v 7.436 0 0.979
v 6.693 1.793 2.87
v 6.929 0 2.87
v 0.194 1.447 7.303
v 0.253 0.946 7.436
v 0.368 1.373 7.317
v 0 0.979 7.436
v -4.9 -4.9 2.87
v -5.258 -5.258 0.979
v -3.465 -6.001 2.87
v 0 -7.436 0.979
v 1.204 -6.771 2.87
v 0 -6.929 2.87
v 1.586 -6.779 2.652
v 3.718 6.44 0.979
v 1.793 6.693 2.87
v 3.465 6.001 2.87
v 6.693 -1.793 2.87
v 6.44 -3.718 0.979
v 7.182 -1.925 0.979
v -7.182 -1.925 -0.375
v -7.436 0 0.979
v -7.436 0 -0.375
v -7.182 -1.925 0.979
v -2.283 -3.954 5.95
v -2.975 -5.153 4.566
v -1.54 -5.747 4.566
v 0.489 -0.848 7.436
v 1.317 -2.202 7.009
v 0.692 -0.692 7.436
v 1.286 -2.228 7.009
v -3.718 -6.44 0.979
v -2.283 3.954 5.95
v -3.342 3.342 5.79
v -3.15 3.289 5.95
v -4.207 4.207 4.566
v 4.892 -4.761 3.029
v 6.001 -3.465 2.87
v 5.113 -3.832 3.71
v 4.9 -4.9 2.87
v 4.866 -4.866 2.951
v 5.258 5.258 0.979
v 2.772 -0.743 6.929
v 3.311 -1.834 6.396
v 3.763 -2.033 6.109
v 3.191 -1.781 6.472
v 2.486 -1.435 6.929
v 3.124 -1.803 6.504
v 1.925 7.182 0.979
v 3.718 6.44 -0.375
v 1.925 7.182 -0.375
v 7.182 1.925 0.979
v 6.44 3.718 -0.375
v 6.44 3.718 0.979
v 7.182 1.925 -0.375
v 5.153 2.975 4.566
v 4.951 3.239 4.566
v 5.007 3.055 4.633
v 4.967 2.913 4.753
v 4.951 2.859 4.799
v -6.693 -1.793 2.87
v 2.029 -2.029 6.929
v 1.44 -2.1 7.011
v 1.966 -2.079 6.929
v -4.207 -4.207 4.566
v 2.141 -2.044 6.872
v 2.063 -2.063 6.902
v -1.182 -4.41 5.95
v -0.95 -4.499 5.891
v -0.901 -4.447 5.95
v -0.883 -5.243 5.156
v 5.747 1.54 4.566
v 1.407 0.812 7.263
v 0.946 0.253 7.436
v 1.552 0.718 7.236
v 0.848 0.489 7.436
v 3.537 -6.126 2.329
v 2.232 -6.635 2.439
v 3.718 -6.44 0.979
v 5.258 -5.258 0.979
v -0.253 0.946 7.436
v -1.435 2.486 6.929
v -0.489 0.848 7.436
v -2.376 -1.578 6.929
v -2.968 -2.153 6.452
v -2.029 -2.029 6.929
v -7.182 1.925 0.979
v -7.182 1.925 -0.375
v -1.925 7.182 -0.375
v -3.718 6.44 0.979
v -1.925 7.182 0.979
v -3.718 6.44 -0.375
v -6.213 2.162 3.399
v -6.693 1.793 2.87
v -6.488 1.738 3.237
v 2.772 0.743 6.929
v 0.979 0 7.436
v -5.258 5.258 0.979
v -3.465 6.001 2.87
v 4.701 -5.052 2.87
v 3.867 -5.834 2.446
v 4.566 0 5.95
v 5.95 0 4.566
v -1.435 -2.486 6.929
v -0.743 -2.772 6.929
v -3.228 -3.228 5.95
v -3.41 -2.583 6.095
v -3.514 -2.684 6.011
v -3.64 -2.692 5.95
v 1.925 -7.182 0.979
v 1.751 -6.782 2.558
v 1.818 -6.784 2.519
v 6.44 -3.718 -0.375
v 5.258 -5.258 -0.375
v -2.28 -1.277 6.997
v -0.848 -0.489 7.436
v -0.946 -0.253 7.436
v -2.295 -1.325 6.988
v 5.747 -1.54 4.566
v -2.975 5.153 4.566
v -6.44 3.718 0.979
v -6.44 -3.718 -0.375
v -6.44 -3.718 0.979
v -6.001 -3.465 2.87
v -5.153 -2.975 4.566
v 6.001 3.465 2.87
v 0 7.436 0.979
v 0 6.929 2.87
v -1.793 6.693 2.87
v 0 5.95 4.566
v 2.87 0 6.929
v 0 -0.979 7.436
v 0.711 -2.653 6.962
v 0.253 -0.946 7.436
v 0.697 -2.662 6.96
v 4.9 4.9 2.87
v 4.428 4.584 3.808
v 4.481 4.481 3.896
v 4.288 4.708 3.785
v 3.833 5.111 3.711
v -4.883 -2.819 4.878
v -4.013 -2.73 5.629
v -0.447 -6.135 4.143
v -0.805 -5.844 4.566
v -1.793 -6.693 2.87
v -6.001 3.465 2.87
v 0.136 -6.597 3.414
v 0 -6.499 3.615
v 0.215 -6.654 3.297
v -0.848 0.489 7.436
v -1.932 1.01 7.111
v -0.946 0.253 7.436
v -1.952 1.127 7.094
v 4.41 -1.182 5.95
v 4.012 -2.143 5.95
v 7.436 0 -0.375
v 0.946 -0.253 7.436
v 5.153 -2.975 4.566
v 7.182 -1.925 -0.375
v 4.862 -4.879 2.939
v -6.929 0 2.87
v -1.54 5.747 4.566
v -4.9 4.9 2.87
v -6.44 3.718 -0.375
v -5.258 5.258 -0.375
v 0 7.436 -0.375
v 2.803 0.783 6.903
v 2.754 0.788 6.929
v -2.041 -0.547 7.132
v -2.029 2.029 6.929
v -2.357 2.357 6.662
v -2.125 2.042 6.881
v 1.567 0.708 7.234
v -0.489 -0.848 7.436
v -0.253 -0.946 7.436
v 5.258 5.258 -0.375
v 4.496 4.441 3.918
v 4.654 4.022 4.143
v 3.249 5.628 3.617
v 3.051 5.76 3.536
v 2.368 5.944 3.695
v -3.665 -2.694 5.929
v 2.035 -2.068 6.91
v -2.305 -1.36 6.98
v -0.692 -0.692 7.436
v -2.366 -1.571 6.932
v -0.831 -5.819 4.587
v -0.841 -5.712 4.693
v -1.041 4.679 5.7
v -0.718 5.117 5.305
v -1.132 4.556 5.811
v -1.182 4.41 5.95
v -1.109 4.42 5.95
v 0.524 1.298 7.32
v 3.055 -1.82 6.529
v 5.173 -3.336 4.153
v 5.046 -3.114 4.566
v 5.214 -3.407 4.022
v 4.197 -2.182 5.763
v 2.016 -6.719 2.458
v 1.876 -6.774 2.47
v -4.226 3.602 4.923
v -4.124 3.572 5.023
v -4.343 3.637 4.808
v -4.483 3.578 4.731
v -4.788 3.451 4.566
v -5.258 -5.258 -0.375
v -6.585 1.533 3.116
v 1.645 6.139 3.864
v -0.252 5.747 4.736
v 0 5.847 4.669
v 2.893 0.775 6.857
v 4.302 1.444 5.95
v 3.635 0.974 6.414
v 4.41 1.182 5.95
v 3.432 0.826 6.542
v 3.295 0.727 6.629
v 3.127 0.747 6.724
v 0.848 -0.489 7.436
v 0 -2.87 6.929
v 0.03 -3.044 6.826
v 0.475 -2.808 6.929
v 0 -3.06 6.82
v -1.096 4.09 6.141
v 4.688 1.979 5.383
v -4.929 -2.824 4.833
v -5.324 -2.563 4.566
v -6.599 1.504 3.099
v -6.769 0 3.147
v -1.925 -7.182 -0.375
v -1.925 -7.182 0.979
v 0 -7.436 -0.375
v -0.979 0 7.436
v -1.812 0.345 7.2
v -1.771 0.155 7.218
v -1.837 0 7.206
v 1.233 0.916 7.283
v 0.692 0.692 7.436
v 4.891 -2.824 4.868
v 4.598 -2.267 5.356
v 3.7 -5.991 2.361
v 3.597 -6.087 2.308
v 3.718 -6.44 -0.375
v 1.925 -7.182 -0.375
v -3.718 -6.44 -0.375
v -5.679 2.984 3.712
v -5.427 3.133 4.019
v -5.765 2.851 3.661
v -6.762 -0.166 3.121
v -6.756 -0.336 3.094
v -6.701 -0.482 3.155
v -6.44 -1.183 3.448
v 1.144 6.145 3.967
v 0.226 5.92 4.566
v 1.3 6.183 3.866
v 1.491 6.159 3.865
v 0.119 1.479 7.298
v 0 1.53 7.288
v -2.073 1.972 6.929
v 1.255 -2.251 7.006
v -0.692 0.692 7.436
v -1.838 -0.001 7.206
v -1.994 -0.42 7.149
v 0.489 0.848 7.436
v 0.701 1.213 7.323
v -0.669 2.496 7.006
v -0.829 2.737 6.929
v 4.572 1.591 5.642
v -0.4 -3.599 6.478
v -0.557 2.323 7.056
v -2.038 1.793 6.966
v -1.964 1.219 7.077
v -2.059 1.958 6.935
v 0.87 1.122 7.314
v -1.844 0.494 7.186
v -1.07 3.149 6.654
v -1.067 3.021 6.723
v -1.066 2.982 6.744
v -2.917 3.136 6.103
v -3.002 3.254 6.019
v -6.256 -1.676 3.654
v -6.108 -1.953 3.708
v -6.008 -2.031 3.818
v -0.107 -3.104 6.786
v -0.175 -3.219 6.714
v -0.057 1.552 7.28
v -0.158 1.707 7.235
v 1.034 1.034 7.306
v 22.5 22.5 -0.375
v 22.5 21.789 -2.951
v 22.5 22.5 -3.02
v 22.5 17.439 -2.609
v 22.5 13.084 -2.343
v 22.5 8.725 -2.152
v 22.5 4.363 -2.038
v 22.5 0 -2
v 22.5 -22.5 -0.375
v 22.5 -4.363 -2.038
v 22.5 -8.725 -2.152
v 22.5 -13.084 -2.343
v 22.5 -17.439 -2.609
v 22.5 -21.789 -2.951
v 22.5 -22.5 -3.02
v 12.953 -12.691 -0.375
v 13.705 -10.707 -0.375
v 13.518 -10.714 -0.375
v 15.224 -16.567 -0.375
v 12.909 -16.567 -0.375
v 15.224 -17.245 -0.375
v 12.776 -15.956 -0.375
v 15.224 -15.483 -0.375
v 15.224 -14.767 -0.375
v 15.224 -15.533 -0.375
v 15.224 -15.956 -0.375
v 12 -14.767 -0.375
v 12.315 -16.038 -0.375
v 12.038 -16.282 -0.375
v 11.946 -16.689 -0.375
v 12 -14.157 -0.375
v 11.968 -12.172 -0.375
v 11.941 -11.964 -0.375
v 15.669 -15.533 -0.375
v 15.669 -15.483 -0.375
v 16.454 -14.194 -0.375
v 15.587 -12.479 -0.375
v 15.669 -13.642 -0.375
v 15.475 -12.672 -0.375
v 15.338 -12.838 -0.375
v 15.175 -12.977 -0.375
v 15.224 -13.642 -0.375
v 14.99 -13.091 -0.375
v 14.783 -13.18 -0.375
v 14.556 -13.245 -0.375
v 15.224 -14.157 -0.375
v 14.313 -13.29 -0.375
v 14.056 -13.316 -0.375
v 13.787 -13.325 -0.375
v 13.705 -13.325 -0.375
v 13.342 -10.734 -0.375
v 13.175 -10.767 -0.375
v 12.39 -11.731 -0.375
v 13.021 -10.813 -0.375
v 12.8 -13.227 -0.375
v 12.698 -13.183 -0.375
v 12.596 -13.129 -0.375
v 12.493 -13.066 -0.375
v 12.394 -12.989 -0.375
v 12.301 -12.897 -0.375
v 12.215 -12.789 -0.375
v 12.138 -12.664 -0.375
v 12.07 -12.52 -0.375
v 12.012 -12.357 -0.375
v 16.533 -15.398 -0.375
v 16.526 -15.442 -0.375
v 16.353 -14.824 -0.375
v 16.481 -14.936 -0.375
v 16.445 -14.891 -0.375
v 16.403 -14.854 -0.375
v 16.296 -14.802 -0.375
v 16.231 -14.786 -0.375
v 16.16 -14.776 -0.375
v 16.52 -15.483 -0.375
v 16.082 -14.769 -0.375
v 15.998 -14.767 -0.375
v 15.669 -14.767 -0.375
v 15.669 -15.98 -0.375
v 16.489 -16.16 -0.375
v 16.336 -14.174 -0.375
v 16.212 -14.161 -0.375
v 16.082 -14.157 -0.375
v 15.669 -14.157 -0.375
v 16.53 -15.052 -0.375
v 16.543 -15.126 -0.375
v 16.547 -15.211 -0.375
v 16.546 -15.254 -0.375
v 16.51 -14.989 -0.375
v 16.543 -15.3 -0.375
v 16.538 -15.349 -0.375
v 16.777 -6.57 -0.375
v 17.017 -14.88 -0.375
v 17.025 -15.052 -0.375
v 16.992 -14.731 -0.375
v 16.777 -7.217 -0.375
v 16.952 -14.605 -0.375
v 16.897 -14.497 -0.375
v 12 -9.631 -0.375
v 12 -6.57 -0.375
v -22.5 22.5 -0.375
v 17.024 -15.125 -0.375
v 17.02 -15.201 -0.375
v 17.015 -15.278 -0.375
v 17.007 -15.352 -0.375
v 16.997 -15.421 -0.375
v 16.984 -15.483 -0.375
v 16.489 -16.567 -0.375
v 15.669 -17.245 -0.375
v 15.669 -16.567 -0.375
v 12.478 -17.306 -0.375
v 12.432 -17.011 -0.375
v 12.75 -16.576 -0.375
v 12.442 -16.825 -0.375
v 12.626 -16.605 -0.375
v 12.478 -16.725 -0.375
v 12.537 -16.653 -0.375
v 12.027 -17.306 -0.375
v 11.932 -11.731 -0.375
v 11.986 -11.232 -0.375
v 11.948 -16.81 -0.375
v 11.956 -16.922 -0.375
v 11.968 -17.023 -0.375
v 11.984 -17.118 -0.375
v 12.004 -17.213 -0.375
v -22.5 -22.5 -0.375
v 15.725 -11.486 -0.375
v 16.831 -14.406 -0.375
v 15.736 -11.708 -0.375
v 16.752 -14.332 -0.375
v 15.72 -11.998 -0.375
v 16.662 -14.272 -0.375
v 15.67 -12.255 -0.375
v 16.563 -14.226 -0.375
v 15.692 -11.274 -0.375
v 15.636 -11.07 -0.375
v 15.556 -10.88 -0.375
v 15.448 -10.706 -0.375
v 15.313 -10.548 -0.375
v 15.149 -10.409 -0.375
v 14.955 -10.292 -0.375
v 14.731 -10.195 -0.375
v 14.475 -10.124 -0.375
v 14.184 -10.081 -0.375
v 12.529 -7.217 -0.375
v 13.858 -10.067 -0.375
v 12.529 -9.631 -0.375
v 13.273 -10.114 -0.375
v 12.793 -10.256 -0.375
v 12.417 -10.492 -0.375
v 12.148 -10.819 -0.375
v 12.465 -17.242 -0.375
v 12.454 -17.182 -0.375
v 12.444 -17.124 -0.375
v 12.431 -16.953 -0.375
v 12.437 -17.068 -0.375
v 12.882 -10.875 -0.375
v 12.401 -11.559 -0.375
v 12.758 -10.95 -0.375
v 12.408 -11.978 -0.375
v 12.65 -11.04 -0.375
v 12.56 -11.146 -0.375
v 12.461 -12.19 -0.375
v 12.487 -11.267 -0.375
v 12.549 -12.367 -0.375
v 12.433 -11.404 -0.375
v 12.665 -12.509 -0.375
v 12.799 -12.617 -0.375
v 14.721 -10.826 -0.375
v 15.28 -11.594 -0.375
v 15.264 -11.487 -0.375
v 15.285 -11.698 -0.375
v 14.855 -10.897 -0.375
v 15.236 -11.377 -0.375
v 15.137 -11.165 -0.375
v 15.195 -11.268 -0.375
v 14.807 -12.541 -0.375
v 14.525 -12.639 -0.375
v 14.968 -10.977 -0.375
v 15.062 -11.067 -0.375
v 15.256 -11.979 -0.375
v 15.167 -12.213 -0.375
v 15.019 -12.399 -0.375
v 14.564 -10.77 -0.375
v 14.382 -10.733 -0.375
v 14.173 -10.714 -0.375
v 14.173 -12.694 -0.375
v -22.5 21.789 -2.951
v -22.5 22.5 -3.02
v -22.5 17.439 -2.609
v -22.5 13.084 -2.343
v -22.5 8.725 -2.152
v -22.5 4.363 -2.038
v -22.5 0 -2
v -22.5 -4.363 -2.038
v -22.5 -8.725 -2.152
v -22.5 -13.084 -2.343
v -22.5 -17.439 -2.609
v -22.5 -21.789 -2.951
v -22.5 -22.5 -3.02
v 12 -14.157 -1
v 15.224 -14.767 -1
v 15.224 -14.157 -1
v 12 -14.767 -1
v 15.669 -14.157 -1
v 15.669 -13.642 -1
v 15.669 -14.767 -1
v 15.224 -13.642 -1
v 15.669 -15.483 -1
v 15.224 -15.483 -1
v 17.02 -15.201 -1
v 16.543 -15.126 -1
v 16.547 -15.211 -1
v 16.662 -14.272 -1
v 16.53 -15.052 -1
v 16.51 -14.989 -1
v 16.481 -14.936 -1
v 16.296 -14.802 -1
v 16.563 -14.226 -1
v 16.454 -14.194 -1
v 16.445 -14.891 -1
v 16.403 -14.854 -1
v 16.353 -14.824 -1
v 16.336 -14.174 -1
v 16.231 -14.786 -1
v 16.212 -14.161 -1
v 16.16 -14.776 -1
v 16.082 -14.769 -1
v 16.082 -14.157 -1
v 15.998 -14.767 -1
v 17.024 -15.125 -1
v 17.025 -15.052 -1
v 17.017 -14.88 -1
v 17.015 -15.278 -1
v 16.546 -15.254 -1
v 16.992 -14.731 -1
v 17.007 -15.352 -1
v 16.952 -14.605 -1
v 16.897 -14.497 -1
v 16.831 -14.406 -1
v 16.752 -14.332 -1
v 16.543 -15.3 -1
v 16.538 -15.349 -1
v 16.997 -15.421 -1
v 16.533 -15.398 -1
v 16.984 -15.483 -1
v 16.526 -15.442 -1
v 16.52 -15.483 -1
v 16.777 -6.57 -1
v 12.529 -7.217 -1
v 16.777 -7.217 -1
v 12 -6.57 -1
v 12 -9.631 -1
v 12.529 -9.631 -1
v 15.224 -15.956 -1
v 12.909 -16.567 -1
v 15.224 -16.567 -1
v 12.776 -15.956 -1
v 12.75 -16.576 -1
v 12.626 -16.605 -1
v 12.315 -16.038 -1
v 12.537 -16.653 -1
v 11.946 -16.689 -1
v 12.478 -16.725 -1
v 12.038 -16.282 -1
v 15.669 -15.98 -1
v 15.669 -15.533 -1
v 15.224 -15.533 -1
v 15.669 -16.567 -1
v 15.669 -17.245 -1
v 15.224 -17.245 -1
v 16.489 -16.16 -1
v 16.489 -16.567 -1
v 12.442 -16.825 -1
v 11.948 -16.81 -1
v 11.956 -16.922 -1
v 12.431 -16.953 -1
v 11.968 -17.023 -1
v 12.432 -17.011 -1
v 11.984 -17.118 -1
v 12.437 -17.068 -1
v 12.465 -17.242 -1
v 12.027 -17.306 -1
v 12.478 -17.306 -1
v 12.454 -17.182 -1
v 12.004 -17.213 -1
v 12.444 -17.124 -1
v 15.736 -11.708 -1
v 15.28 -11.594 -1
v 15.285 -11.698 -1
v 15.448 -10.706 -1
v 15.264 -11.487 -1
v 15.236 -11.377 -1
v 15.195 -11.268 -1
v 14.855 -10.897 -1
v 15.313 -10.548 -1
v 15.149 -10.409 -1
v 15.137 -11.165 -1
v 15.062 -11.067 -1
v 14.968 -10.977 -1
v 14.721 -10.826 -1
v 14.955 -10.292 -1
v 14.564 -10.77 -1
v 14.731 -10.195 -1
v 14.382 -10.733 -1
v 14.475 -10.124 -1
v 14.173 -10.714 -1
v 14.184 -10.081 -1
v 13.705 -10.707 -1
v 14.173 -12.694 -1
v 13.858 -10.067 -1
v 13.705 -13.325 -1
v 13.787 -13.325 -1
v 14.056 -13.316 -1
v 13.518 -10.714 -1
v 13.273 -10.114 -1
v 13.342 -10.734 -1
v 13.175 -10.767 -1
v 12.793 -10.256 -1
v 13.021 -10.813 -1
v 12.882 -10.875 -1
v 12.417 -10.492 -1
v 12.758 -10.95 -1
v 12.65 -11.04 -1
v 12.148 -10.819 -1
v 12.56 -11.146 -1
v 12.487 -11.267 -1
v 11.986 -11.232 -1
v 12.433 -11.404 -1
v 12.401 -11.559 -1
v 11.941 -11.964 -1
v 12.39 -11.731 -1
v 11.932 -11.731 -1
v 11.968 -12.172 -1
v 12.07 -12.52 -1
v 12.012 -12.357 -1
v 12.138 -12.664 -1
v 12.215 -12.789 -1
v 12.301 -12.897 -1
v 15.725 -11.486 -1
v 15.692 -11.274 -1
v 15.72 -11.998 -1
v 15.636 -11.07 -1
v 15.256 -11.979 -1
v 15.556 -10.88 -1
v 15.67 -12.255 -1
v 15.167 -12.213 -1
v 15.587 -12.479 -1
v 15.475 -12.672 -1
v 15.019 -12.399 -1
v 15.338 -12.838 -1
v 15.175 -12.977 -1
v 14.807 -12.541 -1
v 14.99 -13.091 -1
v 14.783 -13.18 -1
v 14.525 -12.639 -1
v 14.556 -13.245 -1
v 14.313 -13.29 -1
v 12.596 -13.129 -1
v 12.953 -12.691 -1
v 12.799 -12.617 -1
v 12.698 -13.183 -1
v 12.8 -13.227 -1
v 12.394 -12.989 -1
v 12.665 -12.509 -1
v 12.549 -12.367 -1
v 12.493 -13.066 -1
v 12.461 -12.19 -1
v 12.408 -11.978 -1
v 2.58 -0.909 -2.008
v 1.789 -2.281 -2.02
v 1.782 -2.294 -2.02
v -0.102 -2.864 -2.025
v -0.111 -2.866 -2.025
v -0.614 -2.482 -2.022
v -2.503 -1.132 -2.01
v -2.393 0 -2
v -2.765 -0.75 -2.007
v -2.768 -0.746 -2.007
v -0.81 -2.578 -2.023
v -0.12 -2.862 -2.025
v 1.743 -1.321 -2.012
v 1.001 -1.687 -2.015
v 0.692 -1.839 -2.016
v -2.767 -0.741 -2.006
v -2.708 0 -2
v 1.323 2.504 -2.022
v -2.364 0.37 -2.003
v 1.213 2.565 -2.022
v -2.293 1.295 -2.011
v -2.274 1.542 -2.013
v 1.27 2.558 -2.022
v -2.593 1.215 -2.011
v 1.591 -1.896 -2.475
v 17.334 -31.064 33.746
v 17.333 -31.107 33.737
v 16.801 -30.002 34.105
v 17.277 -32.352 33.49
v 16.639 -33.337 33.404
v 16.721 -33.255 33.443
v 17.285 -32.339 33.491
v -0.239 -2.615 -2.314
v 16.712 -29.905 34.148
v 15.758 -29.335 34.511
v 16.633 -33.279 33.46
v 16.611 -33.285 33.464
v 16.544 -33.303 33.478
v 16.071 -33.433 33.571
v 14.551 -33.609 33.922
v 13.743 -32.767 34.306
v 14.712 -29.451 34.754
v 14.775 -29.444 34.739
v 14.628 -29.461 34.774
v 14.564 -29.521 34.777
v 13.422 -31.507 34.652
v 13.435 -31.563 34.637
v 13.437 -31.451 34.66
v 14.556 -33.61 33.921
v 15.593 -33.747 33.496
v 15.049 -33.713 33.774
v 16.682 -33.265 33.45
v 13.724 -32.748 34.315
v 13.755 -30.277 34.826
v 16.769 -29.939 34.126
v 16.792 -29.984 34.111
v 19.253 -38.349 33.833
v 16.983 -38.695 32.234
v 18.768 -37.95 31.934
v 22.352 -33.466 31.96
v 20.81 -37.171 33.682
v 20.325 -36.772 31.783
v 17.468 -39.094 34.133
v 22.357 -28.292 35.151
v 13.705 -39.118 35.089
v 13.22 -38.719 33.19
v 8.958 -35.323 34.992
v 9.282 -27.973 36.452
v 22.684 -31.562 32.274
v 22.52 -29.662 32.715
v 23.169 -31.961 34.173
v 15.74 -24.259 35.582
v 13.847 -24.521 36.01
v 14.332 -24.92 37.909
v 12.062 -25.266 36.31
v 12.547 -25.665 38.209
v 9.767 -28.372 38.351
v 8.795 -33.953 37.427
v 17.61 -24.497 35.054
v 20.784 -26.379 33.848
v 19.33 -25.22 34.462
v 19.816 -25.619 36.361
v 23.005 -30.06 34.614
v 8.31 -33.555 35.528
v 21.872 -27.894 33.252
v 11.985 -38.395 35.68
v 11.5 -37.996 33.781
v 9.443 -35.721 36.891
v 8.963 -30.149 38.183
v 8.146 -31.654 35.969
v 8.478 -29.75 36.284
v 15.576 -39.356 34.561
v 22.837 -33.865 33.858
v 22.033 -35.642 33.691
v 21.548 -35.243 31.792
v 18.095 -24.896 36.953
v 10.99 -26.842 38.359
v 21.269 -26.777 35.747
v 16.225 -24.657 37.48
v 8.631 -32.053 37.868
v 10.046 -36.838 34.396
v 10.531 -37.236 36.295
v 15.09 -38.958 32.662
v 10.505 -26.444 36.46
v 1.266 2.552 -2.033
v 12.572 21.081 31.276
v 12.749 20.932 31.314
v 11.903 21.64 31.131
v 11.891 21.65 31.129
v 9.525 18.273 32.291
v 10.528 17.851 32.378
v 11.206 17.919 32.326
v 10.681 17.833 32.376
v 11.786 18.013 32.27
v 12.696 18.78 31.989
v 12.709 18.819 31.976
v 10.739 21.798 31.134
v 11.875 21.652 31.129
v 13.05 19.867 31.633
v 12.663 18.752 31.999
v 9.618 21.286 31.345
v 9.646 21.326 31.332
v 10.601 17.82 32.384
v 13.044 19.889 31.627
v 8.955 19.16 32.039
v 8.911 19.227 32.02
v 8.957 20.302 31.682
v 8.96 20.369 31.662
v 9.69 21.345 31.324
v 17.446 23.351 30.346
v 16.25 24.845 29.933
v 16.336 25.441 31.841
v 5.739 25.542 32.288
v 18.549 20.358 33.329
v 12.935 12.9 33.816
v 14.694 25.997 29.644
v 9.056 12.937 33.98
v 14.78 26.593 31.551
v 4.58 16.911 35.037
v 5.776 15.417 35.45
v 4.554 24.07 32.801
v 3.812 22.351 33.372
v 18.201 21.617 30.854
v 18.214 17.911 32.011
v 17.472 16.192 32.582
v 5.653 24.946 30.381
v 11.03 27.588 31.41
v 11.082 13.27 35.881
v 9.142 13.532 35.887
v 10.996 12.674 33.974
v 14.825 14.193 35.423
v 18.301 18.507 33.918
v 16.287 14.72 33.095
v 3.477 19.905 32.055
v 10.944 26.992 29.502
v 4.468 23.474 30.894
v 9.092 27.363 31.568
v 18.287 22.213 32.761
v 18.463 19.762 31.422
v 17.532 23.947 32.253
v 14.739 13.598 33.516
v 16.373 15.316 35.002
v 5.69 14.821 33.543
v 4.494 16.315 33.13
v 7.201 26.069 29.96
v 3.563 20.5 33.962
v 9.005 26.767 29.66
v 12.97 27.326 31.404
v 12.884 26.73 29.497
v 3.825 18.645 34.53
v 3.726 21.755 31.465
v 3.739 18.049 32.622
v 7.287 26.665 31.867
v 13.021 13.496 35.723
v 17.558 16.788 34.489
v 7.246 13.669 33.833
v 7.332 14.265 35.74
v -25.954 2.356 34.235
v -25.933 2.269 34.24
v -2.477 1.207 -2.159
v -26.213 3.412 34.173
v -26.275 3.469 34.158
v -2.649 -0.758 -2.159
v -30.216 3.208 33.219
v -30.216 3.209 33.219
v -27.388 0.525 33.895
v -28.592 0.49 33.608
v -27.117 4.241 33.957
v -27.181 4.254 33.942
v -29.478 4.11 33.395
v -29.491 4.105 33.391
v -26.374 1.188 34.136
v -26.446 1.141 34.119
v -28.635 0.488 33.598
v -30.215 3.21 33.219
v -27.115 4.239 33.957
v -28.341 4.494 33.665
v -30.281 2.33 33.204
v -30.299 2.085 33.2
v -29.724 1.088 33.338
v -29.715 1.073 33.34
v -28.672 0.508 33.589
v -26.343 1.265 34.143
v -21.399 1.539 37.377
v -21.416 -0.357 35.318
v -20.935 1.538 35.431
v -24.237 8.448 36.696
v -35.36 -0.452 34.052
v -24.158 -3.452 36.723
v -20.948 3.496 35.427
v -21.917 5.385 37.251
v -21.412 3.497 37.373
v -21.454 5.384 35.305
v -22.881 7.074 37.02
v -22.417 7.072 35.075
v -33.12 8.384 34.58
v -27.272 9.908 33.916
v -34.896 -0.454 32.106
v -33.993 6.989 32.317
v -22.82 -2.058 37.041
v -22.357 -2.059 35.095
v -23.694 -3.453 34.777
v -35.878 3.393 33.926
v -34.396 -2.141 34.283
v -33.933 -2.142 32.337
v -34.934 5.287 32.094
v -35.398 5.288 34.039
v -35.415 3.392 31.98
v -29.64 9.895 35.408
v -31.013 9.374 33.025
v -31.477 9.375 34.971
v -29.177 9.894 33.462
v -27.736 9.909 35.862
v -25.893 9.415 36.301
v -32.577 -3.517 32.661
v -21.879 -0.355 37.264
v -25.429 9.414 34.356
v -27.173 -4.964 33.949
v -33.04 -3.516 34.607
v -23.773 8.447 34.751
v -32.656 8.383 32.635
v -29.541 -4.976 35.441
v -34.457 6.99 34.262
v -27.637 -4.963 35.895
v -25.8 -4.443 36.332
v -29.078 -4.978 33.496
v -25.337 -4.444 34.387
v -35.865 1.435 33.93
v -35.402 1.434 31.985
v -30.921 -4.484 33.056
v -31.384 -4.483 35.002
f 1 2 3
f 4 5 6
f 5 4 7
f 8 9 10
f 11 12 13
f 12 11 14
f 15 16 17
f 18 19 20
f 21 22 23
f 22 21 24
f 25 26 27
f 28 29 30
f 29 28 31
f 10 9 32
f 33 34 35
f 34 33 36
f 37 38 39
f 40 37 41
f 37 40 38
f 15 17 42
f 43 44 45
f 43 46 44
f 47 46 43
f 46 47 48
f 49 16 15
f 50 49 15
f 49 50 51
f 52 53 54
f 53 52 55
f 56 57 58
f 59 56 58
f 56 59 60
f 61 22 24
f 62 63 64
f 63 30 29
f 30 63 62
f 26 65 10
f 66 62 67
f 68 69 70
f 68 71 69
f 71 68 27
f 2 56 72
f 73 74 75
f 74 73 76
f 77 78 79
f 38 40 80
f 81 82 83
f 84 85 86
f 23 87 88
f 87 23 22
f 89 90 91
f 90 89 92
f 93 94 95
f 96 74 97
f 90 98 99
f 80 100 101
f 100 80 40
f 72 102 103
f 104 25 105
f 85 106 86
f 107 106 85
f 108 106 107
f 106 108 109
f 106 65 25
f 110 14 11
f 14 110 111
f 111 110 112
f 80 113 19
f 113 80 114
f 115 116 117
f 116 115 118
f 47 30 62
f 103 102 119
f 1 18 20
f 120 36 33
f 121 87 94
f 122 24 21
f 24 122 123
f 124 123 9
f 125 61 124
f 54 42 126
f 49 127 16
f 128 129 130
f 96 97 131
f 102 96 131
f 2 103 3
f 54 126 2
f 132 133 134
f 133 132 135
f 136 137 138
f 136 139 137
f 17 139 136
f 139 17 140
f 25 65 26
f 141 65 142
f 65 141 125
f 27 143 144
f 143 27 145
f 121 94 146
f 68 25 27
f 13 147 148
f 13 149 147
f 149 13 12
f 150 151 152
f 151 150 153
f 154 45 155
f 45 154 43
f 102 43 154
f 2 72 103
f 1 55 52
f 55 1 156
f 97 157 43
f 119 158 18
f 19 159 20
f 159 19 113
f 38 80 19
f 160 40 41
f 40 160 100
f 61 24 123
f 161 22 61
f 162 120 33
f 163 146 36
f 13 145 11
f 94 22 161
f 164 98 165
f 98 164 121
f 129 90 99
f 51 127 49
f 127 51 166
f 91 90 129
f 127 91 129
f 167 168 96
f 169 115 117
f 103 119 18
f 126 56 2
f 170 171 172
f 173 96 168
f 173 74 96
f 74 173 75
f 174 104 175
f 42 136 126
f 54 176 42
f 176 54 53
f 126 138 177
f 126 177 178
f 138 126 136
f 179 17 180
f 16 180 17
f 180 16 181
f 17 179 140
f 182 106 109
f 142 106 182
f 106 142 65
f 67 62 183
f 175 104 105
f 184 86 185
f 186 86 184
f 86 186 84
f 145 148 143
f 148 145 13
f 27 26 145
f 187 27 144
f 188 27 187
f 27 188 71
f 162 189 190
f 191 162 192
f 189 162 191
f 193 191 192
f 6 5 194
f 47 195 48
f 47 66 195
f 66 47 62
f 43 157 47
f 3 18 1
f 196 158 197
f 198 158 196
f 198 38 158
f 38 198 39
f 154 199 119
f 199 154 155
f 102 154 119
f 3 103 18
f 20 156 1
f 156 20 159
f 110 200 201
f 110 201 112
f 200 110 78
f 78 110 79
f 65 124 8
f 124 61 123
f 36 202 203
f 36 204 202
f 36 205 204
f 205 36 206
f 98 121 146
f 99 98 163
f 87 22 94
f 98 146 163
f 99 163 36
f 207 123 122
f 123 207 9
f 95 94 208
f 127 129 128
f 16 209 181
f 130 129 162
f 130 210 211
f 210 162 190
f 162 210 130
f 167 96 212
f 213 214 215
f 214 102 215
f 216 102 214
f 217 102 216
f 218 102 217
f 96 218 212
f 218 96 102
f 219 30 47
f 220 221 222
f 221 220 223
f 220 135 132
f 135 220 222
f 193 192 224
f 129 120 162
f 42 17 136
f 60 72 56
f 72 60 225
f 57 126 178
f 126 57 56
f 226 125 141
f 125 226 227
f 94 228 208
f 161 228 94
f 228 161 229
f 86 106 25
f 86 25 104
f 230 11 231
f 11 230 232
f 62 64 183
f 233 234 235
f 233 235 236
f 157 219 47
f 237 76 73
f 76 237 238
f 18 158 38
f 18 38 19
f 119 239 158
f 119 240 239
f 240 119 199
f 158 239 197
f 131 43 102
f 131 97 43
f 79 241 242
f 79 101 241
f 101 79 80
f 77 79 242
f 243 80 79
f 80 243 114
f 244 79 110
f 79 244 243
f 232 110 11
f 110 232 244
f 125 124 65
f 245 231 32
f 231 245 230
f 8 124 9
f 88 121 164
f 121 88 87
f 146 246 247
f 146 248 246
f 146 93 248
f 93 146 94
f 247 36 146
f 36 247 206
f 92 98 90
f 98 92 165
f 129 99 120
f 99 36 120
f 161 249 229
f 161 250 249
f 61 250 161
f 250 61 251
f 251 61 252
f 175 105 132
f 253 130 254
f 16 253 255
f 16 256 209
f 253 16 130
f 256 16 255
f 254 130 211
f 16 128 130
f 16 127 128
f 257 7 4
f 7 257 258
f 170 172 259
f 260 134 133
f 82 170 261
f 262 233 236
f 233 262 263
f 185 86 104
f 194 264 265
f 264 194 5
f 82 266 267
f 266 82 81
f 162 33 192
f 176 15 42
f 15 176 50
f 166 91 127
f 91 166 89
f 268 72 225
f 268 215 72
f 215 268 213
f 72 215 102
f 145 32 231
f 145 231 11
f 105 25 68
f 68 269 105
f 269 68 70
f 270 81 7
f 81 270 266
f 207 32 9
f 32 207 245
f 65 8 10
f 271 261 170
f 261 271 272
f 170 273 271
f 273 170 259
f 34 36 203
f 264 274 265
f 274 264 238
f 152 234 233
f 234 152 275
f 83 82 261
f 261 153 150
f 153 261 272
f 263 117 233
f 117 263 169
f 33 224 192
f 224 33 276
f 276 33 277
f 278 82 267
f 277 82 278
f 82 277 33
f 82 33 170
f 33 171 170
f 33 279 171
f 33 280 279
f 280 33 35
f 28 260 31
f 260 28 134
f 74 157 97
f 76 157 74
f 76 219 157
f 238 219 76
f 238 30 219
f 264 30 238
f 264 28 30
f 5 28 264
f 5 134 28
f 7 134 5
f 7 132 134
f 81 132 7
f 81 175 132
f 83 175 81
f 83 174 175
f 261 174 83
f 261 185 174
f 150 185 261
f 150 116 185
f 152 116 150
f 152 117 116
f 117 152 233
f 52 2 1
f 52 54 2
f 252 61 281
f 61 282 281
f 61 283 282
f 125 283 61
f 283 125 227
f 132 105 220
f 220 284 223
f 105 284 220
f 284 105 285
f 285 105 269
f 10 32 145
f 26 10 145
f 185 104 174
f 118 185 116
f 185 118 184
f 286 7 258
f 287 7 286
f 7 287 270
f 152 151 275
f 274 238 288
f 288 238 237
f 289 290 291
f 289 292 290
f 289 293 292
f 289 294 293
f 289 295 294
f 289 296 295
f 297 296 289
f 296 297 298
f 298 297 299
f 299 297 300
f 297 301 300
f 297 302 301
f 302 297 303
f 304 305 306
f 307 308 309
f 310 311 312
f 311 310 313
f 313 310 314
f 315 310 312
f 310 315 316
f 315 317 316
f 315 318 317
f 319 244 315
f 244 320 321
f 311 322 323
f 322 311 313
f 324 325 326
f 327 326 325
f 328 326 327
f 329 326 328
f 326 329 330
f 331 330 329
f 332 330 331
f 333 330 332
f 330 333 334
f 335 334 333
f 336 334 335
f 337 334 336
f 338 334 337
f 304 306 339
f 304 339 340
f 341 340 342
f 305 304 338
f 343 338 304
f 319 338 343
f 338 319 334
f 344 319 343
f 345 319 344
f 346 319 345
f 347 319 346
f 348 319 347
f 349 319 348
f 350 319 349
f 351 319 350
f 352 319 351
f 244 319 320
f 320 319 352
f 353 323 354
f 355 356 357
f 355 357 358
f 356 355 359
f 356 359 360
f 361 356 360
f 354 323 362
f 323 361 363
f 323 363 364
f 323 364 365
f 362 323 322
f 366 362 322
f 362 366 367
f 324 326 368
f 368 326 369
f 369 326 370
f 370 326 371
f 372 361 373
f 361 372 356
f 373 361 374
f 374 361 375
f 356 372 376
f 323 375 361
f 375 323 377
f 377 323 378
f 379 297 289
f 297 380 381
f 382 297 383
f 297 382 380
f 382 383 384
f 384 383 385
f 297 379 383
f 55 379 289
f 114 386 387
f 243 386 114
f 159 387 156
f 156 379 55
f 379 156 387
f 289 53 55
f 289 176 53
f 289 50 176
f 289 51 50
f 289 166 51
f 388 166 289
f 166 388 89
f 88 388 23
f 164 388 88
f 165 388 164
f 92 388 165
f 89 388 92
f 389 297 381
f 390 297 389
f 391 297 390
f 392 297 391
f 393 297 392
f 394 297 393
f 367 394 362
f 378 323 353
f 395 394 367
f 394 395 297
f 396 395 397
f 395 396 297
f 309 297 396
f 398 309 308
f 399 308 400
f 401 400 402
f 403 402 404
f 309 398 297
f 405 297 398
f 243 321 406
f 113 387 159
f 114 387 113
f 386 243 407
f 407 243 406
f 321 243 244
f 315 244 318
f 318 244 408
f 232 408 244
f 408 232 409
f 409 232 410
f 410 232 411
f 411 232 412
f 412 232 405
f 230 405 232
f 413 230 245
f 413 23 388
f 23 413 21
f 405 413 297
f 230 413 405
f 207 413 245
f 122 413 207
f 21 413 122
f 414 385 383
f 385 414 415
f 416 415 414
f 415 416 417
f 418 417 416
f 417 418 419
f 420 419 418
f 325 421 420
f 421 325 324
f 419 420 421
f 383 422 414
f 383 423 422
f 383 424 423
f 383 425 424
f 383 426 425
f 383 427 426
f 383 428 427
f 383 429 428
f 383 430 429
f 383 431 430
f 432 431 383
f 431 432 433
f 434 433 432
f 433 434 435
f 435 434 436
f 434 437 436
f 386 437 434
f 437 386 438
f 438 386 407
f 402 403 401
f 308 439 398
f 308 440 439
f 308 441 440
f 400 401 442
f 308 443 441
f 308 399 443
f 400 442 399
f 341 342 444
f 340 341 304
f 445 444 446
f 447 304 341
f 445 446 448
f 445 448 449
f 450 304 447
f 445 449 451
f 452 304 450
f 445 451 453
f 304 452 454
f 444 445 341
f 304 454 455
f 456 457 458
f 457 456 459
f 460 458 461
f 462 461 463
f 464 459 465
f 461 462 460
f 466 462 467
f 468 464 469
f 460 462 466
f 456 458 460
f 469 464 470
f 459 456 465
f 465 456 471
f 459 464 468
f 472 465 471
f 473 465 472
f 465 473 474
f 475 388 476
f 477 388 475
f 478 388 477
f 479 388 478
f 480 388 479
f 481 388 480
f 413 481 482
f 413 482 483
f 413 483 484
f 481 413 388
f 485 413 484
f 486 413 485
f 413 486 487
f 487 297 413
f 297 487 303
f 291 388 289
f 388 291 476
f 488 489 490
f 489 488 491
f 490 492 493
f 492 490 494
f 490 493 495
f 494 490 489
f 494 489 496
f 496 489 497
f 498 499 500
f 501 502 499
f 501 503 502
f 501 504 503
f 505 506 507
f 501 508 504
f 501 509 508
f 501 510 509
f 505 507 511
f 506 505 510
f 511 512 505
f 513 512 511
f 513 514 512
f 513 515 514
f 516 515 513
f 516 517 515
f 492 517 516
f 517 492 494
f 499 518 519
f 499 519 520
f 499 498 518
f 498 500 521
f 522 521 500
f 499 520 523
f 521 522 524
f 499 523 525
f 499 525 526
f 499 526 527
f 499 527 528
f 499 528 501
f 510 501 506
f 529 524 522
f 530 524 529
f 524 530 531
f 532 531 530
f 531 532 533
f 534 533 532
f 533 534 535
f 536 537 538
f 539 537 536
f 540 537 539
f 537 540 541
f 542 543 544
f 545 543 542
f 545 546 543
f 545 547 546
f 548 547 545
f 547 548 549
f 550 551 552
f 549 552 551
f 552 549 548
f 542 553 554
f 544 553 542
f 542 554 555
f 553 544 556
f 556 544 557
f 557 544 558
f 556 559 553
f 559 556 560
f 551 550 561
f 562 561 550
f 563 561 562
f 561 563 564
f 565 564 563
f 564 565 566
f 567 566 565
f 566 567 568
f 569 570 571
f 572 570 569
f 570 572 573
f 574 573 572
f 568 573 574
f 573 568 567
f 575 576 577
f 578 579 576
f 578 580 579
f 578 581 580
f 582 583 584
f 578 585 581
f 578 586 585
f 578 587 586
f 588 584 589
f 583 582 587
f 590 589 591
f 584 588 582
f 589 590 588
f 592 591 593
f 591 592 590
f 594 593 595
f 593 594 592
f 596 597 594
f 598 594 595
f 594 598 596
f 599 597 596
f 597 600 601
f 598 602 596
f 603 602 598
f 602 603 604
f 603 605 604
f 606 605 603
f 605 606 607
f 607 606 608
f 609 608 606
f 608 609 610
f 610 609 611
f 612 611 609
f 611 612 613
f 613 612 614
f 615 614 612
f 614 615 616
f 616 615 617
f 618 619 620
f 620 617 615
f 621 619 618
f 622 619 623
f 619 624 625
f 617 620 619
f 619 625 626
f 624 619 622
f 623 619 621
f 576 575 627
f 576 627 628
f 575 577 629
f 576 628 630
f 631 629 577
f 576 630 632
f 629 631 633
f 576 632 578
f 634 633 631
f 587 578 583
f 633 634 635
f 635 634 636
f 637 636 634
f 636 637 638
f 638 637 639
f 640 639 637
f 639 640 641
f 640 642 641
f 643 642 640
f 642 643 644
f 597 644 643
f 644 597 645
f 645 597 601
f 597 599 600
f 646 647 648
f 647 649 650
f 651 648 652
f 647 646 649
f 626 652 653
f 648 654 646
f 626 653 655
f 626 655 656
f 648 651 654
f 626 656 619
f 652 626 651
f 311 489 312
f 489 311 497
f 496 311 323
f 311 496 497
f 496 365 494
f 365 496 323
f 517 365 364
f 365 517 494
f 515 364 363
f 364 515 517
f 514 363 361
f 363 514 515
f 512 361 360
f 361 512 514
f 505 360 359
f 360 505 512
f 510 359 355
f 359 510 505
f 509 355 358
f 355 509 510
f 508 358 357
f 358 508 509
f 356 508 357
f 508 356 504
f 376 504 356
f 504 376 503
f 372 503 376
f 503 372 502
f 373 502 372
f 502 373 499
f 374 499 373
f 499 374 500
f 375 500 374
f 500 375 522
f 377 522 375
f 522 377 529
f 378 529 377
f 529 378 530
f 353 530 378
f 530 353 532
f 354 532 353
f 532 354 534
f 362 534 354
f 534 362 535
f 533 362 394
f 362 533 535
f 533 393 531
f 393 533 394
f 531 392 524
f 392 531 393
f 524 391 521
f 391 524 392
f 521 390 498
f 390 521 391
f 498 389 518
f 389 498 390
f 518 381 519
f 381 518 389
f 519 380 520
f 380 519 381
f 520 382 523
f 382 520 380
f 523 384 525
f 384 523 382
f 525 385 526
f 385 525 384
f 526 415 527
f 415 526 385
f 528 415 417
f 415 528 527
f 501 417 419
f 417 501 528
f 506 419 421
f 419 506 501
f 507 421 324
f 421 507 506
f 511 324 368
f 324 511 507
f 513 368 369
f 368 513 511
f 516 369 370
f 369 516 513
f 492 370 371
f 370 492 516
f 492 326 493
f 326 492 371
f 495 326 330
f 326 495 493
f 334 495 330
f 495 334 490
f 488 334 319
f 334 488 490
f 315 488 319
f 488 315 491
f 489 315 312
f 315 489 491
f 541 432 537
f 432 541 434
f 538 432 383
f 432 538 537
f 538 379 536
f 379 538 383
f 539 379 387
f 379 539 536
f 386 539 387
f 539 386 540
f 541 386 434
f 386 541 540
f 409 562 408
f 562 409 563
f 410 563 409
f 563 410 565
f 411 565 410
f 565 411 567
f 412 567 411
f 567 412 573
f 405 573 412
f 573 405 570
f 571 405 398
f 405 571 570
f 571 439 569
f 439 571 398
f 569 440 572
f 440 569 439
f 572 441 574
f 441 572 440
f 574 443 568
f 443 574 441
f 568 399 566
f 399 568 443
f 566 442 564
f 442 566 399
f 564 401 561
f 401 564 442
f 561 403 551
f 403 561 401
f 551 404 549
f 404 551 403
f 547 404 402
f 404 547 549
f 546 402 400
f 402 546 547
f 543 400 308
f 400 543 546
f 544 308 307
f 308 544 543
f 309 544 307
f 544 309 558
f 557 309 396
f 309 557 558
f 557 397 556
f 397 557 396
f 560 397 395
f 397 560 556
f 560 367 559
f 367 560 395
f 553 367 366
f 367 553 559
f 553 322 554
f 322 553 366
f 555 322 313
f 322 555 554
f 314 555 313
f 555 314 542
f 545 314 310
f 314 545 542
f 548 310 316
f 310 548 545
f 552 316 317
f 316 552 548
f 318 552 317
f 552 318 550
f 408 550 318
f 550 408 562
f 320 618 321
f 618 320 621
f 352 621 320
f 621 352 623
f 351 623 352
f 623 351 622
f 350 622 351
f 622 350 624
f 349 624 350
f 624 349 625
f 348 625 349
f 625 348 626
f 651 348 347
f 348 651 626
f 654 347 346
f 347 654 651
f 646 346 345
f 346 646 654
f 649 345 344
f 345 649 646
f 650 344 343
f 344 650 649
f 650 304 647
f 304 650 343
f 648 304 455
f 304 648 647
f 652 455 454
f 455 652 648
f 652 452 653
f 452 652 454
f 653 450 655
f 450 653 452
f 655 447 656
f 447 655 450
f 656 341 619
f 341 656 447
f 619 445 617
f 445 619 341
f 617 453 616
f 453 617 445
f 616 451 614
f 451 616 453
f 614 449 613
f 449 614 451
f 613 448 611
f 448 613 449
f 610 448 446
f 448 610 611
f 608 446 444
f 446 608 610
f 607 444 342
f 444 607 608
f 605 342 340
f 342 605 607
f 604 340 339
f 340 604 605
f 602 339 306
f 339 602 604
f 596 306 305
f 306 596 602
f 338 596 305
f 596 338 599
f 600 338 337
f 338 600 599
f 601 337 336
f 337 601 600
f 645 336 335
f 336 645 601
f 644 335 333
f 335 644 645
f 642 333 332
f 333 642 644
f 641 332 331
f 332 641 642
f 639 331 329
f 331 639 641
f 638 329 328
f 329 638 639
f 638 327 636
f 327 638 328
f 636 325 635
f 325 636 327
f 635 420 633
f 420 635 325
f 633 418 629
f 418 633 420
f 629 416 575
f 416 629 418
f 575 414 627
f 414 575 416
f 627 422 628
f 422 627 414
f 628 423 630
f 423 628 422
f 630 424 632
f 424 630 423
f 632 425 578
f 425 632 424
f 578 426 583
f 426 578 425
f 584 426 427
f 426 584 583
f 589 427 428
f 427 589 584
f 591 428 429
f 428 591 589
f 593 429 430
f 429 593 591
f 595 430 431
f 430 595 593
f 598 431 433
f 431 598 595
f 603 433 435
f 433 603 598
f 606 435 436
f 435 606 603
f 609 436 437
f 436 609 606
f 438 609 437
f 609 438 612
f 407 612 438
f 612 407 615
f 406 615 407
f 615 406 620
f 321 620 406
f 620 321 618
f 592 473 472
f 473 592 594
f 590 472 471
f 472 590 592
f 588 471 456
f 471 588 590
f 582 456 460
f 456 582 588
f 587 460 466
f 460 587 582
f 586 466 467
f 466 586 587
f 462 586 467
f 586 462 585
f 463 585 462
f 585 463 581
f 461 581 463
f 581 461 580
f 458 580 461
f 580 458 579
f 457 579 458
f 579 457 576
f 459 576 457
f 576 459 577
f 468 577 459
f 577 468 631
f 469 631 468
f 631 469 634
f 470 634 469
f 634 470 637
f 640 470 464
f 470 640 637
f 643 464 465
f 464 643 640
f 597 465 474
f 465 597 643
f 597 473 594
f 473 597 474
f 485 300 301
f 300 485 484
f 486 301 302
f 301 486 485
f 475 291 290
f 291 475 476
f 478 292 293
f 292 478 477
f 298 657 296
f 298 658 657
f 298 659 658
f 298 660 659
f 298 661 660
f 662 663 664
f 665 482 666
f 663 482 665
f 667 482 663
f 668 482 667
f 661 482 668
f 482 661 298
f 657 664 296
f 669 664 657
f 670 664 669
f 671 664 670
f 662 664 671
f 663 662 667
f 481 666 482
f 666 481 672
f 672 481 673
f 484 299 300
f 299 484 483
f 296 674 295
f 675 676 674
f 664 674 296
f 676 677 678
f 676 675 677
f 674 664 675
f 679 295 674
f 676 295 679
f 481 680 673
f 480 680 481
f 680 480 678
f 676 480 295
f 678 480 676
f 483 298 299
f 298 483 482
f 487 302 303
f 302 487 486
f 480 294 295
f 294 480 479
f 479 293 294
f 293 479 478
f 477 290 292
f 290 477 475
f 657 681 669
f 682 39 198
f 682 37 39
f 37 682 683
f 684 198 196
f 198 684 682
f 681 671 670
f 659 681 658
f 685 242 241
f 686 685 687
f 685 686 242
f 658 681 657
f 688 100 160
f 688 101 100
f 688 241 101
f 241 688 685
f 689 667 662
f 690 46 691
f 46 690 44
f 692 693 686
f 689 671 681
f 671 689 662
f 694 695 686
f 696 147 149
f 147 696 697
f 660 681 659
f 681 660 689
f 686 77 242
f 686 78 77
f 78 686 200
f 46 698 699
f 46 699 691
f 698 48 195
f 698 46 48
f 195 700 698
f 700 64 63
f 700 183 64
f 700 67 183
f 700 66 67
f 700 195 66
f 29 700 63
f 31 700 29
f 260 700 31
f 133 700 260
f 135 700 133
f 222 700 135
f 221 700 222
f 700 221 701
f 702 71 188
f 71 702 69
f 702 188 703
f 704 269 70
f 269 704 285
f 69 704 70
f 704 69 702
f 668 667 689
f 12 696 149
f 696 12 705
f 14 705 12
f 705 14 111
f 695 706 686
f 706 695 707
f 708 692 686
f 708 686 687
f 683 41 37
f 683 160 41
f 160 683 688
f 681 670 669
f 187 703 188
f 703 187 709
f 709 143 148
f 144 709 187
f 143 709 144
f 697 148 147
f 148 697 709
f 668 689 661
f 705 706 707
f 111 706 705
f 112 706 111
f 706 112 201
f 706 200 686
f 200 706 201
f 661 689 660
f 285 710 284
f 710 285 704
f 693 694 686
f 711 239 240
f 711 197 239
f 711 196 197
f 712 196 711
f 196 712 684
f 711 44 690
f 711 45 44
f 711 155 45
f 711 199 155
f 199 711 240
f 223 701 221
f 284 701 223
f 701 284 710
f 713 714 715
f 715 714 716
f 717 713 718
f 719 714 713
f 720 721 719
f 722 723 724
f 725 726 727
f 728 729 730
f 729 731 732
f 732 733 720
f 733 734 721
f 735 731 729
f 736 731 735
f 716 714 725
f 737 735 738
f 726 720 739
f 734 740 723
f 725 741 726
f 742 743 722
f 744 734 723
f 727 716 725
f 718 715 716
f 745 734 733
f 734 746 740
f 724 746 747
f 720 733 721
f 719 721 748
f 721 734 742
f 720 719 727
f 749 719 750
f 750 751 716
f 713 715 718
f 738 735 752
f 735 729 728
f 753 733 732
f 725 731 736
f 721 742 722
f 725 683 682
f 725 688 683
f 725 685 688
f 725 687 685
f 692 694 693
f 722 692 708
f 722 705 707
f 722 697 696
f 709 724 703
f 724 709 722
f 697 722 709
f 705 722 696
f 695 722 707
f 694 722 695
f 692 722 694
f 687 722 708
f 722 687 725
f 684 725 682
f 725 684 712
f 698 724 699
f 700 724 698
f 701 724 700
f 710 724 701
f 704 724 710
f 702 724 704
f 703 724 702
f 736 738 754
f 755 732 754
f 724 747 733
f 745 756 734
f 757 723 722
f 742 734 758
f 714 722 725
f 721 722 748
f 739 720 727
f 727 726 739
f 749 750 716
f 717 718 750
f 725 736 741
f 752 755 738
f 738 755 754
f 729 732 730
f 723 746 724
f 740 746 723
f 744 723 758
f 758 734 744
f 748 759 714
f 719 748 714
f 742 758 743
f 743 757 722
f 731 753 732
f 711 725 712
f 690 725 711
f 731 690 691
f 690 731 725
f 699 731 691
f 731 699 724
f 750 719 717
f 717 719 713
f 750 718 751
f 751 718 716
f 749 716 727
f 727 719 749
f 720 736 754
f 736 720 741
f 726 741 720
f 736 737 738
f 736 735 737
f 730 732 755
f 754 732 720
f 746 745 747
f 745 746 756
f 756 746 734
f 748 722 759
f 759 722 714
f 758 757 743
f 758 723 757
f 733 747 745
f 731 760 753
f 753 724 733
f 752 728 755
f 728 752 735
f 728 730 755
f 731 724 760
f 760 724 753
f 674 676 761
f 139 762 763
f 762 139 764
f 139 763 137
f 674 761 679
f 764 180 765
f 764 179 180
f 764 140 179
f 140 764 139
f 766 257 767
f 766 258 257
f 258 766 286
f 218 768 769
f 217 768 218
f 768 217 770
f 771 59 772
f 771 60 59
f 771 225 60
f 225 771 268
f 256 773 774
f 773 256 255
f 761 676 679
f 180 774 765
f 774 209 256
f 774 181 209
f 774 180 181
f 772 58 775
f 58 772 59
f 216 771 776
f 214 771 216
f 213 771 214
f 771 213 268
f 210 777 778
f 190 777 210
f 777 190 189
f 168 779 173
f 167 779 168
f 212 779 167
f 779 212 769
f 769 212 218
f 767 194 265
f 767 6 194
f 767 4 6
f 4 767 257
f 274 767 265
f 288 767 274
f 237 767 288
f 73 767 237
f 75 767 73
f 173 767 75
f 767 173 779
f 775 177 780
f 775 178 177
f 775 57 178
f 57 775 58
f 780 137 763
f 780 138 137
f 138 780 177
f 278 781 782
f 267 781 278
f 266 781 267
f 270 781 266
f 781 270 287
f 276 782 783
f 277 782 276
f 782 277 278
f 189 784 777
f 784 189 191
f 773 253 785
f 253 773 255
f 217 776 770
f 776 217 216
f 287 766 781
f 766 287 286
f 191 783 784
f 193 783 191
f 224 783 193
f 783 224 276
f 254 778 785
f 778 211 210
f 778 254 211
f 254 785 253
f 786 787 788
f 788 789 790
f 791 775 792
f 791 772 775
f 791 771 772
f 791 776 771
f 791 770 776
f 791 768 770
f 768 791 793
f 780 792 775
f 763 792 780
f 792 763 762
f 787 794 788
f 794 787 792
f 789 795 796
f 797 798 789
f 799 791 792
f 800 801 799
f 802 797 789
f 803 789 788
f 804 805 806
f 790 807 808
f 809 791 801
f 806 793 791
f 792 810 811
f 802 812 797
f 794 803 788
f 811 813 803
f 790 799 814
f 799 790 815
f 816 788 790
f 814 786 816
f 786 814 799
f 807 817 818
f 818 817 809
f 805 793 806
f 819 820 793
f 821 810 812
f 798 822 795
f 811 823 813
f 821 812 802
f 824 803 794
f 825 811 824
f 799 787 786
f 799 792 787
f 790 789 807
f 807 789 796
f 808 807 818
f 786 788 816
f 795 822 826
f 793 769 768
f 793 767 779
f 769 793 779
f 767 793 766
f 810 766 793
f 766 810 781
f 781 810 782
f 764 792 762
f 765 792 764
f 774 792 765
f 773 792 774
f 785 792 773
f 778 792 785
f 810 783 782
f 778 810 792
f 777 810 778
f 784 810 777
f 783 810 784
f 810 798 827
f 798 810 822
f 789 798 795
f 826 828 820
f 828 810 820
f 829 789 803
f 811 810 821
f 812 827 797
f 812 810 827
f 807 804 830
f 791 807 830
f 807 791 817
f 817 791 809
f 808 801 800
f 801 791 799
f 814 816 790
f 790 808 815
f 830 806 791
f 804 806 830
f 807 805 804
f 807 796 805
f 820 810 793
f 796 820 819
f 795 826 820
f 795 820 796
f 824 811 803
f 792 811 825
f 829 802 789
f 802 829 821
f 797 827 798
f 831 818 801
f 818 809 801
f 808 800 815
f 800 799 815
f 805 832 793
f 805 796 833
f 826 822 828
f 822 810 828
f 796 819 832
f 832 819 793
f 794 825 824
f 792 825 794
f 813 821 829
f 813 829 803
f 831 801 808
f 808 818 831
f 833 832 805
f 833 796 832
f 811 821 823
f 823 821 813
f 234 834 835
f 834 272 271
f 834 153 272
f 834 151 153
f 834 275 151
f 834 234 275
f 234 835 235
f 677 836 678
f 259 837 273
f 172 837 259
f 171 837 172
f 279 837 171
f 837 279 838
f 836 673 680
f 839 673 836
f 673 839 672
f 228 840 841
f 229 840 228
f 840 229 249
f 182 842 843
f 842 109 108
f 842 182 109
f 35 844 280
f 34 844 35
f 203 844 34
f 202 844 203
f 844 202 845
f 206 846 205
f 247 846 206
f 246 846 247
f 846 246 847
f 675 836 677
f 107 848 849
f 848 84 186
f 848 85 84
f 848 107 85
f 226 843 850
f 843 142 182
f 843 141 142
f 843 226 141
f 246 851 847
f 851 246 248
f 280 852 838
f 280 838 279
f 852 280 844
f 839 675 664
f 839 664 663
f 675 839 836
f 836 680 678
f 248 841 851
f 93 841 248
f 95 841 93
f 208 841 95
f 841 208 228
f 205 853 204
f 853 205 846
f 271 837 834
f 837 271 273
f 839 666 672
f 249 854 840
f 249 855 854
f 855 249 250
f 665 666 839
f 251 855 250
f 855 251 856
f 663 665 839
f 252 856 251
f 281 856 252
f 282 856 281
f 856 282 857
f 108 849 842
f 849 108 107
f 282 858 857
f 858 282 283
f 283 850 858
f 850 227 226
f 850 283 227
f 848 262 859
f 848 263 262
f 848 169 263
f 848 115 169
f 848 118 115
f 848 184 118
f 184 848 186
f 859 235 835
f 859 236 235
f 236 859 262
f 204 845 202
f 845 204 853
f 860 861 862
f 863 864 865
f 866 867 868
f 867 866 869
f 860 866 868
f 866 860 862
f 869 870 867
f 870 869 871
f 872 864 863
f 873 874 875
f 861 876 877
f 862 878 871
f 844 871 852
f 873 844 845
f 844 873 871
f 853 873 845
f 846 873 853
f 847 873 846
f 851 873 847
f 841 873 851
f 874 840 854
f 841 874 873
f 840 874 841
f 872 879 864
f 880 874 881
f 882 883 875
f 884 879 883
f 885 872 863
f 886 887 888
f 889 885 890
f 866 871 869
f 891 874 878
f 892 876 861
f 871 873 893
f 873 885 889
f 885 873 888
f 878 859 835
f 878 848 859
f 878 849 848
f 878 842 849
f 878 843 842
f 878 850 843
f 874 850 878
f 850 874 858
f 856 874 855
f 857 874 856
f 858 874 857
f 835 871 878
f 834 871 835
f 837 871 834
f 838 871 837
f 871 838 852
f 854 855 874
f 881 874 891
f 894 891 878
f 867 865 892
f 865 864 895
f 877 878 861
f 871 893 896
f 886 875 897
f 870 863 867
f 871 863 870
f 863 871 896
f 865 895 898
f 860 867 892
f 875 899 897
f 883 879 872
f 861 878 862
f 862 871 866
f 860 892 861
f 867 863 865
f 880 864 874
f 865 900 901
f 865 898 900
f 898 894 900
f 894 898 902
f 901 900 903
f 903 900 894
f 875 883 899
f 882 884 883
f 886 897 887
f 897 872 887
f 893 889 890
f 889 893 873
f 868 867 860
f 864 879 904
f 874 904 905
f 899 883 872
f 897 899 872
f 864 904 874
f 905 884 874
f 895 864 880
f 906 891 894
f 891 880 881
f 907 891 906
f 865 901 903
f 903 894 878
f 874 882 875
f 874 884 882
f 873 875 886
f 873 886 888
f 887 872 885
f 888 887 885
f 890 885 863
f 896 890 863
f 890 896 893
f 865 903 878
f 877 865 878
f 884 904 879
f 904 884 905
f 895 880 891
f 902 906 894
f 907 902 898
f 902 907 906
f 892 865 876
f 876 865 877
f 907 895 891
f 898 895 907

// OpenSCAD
module Spine(len, rot) {
  rotate(rot) {
    cylinder(h=len, d1=7, d2=4);
  }
  rotate(rot)
    translate([0, 0, len-1])
      rotate([0, rot[1]/1.5, -rot[2]/2])
        cylinder(h=2, d=15);
}

module Base() {
  diameter=15;
  rect = 45;
  thick = 3;

  translate([0, 0, diameter/8])
    cube([rect, rect, thick], center=true);
  difference() {
    sphere(d=diameter);
    translate([0, 0, diameter/3])
      cube([rect, rect, diameter/2], center=true);
  }
}

module BaseWithCurve(txt) {
  diam=500;
  difference() {
    Base();
    Txt(txt);
    translate([0, 0, diam/2+2])
      rotate([90, 0, 90])
        cylinder(h=45, d=diam, center=true, $fa=1);
  }
}

module Txt(txt) {
  translate([12, 6, 1])
    rotate([180, 0, 90])
      linear_extrude(height=2)
        text(txt, size=5);
}

rotate([180, 0, 0]) {
  if (true) {
    BaseWithCurve("Left");
    Spine(50, [190, -45, 50]);
    Spine(40, [160, -30, -25]);
    Spine(45, [180, 40, 5]);
  } else {
    BaseWithCurve("Right");
    Spine(40, [190, -45, 25]);
    Spine(45, [160, -30, -25]);
    Spine(50, [180, 40, 5]);
  }
}
